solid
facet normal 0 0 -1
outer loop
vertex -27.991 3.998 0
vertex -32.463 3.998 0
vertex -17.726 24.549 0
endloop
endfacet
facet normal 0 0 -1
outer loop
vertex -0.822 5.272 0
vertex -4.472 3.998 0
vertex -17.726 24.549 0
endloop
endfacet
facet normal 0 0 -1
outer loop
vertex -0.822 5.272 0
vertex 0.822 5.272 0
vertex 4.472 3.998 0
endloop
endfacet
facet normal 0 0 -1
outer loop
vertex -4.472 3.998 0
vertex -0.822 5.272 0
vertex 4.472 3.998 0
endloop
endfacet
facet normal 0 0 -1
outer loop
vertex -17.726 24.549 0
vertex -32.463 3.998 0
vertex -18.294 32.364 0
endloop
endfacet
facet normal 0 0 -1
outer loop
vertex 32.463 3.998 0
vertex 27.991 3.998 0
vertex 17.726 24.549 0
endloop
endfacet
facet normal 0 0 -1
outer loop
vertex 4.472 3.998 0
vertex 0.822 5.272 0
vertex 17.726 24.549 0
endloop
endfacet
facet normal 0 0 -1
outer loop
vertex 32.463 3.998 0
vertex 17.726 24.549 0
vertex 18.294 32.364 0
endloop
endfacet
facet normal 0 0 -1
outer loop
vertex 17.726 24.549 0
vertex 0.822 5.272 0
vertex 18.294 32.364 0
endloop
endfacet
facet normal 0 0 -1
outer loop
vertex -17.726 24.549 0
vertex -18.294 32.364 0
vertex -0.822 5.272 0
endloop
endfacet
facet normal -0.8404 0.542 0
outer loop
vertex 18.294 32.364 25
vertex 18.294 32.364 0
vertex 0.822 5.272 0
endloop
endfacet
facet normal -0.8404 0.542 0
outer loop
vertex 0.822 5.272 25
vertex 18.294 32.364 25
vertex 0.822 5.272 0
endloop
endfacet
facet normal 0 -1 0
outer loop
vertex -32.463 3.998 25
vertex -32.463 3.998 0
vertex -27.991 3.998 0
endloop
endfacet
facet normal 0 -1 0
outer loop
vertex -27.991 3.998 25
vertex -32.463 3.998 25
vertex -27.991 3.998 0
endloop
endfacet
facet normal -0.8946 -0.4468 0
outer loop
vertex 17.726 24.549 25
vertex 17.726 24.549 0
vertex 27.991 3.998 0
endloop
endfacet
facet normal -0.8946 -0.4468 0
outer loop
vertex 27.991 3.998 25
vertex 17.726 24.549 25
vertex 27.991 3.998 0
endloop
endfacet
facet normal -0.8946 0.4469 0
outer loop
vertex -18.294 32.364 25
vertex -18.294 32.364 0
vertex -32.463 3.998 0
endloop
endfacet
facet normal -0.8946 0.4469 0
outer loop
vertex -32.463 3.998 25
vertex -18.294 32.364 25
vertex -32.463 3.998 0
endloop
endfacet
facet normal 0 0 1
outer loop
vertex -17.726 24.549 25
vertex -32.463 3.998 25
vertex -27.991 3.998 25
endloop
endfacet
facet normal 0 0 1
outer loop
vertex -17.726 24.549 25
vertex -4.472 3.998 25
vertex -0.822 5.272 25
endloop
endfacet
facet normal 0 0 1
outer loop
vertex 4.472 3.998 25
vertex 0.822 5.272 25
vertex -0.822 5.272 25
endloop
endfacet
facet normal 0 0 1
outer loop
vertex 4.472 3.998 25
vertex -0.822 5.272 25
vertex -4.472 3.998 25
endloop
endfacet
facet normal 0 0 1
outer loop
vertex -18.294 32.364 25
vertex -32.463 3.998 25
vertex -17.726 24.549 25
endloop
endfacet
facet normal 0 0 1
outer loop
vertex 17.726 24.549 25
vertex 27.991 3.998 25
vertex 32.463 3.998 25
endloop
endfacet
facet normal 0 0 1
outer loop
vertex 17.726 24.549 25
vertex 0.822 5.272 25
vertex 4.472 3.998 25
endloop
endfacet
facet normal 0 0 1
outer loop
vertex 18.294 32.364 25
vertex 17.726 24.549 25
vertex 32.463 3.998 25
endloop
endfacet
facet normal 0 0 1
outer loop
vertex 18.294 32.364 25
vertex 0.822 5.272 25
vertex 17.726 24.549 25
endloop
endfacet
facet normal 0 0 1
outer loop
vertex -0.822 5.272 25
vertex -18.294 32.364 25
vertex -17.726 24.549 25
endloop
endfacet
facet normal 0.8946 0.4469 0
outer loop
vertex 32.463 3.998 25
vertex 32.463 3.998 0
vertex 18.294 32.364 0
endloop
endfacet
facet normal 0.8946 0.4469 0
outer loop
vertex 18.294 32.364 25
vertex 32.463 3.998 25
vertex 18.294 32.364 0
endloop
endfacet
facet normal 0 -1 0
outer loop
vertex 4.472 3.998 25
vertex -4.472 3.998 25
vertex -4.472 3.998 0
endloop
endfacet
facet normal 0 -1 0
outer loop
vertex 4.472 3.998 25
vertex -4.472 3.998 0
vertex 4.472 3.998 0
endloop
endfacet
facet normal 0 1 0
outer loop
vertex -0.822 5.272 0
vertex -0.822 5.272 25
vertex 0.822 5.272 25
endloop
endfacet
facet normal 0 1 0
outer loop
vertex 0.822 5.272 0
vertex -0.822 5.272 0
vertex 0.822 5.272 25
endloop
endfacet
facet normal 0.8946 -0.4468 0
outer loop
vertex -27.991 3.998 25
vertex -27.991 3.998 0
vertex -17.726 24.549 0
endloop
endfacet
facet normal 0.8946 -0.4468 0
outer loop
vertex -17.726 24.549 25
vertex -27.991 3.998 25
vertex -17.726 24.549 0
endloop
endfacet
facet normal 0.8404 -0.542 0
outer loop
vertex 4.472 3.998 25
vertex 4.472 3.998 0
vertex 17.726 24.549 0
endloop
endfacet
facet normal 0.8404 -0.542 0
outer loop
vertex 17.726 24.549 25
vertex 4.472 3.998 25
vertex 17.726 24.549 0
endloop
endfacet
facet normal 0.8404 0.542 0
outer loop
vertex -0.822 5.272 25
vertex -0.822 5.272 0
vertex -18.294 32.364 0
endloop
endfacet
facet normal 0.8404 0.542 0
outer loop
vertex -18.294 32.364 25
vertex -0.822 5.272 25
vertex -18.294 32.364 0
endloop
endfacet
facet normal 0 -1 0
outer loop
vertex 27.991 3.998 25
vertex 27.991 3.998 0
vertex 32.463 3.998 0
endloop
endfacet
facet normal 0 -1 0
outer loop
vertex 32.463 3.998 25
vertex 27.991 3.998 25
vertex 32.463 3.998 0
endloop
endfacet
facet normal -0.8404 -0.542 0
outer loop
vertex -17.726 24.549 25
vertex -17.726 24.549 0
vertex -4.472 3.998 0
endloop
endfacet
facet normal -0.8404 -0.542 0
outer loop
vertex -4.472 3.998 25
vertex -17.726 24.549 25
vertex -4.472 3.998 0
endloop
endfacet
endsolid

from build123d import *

# Parameters (mm, degrees)
F1_DEPTH = 25
F2_W     = 8.943856
F2_H     = 1.274483
F3_DEPTH = 25


with BuildPart() as f1:
    # F0 (on Top) → F1 (new body)
    with BuildSketch(Plane.XY):
        Polygon((-4.471928, 3.997871), (0, 3.997871), (-18.293965, 32.363827), (-32.462839, 3.997871), (-27.990839, 3.997871), (-17.725671, 24.548642), align=None)
        Polygon((18.293965, 32.363827), (0, 3.997871), (4.471928, 3.997871), (17.725671, 24.548642), (27.990839, 3.997871), (32.462839, 3.997871), align=None)
    extrude(amount=F1_DEPTH)

    # F2 (on face) → F3 (join)
    with BuildSketch(Plane.XY.offset(25)):
        with Locations((0, 4.635112)):
            Rectangle(F2_W, F2_H)
    extrude(amount=-F3_DEPTH)


solid = f1.part
